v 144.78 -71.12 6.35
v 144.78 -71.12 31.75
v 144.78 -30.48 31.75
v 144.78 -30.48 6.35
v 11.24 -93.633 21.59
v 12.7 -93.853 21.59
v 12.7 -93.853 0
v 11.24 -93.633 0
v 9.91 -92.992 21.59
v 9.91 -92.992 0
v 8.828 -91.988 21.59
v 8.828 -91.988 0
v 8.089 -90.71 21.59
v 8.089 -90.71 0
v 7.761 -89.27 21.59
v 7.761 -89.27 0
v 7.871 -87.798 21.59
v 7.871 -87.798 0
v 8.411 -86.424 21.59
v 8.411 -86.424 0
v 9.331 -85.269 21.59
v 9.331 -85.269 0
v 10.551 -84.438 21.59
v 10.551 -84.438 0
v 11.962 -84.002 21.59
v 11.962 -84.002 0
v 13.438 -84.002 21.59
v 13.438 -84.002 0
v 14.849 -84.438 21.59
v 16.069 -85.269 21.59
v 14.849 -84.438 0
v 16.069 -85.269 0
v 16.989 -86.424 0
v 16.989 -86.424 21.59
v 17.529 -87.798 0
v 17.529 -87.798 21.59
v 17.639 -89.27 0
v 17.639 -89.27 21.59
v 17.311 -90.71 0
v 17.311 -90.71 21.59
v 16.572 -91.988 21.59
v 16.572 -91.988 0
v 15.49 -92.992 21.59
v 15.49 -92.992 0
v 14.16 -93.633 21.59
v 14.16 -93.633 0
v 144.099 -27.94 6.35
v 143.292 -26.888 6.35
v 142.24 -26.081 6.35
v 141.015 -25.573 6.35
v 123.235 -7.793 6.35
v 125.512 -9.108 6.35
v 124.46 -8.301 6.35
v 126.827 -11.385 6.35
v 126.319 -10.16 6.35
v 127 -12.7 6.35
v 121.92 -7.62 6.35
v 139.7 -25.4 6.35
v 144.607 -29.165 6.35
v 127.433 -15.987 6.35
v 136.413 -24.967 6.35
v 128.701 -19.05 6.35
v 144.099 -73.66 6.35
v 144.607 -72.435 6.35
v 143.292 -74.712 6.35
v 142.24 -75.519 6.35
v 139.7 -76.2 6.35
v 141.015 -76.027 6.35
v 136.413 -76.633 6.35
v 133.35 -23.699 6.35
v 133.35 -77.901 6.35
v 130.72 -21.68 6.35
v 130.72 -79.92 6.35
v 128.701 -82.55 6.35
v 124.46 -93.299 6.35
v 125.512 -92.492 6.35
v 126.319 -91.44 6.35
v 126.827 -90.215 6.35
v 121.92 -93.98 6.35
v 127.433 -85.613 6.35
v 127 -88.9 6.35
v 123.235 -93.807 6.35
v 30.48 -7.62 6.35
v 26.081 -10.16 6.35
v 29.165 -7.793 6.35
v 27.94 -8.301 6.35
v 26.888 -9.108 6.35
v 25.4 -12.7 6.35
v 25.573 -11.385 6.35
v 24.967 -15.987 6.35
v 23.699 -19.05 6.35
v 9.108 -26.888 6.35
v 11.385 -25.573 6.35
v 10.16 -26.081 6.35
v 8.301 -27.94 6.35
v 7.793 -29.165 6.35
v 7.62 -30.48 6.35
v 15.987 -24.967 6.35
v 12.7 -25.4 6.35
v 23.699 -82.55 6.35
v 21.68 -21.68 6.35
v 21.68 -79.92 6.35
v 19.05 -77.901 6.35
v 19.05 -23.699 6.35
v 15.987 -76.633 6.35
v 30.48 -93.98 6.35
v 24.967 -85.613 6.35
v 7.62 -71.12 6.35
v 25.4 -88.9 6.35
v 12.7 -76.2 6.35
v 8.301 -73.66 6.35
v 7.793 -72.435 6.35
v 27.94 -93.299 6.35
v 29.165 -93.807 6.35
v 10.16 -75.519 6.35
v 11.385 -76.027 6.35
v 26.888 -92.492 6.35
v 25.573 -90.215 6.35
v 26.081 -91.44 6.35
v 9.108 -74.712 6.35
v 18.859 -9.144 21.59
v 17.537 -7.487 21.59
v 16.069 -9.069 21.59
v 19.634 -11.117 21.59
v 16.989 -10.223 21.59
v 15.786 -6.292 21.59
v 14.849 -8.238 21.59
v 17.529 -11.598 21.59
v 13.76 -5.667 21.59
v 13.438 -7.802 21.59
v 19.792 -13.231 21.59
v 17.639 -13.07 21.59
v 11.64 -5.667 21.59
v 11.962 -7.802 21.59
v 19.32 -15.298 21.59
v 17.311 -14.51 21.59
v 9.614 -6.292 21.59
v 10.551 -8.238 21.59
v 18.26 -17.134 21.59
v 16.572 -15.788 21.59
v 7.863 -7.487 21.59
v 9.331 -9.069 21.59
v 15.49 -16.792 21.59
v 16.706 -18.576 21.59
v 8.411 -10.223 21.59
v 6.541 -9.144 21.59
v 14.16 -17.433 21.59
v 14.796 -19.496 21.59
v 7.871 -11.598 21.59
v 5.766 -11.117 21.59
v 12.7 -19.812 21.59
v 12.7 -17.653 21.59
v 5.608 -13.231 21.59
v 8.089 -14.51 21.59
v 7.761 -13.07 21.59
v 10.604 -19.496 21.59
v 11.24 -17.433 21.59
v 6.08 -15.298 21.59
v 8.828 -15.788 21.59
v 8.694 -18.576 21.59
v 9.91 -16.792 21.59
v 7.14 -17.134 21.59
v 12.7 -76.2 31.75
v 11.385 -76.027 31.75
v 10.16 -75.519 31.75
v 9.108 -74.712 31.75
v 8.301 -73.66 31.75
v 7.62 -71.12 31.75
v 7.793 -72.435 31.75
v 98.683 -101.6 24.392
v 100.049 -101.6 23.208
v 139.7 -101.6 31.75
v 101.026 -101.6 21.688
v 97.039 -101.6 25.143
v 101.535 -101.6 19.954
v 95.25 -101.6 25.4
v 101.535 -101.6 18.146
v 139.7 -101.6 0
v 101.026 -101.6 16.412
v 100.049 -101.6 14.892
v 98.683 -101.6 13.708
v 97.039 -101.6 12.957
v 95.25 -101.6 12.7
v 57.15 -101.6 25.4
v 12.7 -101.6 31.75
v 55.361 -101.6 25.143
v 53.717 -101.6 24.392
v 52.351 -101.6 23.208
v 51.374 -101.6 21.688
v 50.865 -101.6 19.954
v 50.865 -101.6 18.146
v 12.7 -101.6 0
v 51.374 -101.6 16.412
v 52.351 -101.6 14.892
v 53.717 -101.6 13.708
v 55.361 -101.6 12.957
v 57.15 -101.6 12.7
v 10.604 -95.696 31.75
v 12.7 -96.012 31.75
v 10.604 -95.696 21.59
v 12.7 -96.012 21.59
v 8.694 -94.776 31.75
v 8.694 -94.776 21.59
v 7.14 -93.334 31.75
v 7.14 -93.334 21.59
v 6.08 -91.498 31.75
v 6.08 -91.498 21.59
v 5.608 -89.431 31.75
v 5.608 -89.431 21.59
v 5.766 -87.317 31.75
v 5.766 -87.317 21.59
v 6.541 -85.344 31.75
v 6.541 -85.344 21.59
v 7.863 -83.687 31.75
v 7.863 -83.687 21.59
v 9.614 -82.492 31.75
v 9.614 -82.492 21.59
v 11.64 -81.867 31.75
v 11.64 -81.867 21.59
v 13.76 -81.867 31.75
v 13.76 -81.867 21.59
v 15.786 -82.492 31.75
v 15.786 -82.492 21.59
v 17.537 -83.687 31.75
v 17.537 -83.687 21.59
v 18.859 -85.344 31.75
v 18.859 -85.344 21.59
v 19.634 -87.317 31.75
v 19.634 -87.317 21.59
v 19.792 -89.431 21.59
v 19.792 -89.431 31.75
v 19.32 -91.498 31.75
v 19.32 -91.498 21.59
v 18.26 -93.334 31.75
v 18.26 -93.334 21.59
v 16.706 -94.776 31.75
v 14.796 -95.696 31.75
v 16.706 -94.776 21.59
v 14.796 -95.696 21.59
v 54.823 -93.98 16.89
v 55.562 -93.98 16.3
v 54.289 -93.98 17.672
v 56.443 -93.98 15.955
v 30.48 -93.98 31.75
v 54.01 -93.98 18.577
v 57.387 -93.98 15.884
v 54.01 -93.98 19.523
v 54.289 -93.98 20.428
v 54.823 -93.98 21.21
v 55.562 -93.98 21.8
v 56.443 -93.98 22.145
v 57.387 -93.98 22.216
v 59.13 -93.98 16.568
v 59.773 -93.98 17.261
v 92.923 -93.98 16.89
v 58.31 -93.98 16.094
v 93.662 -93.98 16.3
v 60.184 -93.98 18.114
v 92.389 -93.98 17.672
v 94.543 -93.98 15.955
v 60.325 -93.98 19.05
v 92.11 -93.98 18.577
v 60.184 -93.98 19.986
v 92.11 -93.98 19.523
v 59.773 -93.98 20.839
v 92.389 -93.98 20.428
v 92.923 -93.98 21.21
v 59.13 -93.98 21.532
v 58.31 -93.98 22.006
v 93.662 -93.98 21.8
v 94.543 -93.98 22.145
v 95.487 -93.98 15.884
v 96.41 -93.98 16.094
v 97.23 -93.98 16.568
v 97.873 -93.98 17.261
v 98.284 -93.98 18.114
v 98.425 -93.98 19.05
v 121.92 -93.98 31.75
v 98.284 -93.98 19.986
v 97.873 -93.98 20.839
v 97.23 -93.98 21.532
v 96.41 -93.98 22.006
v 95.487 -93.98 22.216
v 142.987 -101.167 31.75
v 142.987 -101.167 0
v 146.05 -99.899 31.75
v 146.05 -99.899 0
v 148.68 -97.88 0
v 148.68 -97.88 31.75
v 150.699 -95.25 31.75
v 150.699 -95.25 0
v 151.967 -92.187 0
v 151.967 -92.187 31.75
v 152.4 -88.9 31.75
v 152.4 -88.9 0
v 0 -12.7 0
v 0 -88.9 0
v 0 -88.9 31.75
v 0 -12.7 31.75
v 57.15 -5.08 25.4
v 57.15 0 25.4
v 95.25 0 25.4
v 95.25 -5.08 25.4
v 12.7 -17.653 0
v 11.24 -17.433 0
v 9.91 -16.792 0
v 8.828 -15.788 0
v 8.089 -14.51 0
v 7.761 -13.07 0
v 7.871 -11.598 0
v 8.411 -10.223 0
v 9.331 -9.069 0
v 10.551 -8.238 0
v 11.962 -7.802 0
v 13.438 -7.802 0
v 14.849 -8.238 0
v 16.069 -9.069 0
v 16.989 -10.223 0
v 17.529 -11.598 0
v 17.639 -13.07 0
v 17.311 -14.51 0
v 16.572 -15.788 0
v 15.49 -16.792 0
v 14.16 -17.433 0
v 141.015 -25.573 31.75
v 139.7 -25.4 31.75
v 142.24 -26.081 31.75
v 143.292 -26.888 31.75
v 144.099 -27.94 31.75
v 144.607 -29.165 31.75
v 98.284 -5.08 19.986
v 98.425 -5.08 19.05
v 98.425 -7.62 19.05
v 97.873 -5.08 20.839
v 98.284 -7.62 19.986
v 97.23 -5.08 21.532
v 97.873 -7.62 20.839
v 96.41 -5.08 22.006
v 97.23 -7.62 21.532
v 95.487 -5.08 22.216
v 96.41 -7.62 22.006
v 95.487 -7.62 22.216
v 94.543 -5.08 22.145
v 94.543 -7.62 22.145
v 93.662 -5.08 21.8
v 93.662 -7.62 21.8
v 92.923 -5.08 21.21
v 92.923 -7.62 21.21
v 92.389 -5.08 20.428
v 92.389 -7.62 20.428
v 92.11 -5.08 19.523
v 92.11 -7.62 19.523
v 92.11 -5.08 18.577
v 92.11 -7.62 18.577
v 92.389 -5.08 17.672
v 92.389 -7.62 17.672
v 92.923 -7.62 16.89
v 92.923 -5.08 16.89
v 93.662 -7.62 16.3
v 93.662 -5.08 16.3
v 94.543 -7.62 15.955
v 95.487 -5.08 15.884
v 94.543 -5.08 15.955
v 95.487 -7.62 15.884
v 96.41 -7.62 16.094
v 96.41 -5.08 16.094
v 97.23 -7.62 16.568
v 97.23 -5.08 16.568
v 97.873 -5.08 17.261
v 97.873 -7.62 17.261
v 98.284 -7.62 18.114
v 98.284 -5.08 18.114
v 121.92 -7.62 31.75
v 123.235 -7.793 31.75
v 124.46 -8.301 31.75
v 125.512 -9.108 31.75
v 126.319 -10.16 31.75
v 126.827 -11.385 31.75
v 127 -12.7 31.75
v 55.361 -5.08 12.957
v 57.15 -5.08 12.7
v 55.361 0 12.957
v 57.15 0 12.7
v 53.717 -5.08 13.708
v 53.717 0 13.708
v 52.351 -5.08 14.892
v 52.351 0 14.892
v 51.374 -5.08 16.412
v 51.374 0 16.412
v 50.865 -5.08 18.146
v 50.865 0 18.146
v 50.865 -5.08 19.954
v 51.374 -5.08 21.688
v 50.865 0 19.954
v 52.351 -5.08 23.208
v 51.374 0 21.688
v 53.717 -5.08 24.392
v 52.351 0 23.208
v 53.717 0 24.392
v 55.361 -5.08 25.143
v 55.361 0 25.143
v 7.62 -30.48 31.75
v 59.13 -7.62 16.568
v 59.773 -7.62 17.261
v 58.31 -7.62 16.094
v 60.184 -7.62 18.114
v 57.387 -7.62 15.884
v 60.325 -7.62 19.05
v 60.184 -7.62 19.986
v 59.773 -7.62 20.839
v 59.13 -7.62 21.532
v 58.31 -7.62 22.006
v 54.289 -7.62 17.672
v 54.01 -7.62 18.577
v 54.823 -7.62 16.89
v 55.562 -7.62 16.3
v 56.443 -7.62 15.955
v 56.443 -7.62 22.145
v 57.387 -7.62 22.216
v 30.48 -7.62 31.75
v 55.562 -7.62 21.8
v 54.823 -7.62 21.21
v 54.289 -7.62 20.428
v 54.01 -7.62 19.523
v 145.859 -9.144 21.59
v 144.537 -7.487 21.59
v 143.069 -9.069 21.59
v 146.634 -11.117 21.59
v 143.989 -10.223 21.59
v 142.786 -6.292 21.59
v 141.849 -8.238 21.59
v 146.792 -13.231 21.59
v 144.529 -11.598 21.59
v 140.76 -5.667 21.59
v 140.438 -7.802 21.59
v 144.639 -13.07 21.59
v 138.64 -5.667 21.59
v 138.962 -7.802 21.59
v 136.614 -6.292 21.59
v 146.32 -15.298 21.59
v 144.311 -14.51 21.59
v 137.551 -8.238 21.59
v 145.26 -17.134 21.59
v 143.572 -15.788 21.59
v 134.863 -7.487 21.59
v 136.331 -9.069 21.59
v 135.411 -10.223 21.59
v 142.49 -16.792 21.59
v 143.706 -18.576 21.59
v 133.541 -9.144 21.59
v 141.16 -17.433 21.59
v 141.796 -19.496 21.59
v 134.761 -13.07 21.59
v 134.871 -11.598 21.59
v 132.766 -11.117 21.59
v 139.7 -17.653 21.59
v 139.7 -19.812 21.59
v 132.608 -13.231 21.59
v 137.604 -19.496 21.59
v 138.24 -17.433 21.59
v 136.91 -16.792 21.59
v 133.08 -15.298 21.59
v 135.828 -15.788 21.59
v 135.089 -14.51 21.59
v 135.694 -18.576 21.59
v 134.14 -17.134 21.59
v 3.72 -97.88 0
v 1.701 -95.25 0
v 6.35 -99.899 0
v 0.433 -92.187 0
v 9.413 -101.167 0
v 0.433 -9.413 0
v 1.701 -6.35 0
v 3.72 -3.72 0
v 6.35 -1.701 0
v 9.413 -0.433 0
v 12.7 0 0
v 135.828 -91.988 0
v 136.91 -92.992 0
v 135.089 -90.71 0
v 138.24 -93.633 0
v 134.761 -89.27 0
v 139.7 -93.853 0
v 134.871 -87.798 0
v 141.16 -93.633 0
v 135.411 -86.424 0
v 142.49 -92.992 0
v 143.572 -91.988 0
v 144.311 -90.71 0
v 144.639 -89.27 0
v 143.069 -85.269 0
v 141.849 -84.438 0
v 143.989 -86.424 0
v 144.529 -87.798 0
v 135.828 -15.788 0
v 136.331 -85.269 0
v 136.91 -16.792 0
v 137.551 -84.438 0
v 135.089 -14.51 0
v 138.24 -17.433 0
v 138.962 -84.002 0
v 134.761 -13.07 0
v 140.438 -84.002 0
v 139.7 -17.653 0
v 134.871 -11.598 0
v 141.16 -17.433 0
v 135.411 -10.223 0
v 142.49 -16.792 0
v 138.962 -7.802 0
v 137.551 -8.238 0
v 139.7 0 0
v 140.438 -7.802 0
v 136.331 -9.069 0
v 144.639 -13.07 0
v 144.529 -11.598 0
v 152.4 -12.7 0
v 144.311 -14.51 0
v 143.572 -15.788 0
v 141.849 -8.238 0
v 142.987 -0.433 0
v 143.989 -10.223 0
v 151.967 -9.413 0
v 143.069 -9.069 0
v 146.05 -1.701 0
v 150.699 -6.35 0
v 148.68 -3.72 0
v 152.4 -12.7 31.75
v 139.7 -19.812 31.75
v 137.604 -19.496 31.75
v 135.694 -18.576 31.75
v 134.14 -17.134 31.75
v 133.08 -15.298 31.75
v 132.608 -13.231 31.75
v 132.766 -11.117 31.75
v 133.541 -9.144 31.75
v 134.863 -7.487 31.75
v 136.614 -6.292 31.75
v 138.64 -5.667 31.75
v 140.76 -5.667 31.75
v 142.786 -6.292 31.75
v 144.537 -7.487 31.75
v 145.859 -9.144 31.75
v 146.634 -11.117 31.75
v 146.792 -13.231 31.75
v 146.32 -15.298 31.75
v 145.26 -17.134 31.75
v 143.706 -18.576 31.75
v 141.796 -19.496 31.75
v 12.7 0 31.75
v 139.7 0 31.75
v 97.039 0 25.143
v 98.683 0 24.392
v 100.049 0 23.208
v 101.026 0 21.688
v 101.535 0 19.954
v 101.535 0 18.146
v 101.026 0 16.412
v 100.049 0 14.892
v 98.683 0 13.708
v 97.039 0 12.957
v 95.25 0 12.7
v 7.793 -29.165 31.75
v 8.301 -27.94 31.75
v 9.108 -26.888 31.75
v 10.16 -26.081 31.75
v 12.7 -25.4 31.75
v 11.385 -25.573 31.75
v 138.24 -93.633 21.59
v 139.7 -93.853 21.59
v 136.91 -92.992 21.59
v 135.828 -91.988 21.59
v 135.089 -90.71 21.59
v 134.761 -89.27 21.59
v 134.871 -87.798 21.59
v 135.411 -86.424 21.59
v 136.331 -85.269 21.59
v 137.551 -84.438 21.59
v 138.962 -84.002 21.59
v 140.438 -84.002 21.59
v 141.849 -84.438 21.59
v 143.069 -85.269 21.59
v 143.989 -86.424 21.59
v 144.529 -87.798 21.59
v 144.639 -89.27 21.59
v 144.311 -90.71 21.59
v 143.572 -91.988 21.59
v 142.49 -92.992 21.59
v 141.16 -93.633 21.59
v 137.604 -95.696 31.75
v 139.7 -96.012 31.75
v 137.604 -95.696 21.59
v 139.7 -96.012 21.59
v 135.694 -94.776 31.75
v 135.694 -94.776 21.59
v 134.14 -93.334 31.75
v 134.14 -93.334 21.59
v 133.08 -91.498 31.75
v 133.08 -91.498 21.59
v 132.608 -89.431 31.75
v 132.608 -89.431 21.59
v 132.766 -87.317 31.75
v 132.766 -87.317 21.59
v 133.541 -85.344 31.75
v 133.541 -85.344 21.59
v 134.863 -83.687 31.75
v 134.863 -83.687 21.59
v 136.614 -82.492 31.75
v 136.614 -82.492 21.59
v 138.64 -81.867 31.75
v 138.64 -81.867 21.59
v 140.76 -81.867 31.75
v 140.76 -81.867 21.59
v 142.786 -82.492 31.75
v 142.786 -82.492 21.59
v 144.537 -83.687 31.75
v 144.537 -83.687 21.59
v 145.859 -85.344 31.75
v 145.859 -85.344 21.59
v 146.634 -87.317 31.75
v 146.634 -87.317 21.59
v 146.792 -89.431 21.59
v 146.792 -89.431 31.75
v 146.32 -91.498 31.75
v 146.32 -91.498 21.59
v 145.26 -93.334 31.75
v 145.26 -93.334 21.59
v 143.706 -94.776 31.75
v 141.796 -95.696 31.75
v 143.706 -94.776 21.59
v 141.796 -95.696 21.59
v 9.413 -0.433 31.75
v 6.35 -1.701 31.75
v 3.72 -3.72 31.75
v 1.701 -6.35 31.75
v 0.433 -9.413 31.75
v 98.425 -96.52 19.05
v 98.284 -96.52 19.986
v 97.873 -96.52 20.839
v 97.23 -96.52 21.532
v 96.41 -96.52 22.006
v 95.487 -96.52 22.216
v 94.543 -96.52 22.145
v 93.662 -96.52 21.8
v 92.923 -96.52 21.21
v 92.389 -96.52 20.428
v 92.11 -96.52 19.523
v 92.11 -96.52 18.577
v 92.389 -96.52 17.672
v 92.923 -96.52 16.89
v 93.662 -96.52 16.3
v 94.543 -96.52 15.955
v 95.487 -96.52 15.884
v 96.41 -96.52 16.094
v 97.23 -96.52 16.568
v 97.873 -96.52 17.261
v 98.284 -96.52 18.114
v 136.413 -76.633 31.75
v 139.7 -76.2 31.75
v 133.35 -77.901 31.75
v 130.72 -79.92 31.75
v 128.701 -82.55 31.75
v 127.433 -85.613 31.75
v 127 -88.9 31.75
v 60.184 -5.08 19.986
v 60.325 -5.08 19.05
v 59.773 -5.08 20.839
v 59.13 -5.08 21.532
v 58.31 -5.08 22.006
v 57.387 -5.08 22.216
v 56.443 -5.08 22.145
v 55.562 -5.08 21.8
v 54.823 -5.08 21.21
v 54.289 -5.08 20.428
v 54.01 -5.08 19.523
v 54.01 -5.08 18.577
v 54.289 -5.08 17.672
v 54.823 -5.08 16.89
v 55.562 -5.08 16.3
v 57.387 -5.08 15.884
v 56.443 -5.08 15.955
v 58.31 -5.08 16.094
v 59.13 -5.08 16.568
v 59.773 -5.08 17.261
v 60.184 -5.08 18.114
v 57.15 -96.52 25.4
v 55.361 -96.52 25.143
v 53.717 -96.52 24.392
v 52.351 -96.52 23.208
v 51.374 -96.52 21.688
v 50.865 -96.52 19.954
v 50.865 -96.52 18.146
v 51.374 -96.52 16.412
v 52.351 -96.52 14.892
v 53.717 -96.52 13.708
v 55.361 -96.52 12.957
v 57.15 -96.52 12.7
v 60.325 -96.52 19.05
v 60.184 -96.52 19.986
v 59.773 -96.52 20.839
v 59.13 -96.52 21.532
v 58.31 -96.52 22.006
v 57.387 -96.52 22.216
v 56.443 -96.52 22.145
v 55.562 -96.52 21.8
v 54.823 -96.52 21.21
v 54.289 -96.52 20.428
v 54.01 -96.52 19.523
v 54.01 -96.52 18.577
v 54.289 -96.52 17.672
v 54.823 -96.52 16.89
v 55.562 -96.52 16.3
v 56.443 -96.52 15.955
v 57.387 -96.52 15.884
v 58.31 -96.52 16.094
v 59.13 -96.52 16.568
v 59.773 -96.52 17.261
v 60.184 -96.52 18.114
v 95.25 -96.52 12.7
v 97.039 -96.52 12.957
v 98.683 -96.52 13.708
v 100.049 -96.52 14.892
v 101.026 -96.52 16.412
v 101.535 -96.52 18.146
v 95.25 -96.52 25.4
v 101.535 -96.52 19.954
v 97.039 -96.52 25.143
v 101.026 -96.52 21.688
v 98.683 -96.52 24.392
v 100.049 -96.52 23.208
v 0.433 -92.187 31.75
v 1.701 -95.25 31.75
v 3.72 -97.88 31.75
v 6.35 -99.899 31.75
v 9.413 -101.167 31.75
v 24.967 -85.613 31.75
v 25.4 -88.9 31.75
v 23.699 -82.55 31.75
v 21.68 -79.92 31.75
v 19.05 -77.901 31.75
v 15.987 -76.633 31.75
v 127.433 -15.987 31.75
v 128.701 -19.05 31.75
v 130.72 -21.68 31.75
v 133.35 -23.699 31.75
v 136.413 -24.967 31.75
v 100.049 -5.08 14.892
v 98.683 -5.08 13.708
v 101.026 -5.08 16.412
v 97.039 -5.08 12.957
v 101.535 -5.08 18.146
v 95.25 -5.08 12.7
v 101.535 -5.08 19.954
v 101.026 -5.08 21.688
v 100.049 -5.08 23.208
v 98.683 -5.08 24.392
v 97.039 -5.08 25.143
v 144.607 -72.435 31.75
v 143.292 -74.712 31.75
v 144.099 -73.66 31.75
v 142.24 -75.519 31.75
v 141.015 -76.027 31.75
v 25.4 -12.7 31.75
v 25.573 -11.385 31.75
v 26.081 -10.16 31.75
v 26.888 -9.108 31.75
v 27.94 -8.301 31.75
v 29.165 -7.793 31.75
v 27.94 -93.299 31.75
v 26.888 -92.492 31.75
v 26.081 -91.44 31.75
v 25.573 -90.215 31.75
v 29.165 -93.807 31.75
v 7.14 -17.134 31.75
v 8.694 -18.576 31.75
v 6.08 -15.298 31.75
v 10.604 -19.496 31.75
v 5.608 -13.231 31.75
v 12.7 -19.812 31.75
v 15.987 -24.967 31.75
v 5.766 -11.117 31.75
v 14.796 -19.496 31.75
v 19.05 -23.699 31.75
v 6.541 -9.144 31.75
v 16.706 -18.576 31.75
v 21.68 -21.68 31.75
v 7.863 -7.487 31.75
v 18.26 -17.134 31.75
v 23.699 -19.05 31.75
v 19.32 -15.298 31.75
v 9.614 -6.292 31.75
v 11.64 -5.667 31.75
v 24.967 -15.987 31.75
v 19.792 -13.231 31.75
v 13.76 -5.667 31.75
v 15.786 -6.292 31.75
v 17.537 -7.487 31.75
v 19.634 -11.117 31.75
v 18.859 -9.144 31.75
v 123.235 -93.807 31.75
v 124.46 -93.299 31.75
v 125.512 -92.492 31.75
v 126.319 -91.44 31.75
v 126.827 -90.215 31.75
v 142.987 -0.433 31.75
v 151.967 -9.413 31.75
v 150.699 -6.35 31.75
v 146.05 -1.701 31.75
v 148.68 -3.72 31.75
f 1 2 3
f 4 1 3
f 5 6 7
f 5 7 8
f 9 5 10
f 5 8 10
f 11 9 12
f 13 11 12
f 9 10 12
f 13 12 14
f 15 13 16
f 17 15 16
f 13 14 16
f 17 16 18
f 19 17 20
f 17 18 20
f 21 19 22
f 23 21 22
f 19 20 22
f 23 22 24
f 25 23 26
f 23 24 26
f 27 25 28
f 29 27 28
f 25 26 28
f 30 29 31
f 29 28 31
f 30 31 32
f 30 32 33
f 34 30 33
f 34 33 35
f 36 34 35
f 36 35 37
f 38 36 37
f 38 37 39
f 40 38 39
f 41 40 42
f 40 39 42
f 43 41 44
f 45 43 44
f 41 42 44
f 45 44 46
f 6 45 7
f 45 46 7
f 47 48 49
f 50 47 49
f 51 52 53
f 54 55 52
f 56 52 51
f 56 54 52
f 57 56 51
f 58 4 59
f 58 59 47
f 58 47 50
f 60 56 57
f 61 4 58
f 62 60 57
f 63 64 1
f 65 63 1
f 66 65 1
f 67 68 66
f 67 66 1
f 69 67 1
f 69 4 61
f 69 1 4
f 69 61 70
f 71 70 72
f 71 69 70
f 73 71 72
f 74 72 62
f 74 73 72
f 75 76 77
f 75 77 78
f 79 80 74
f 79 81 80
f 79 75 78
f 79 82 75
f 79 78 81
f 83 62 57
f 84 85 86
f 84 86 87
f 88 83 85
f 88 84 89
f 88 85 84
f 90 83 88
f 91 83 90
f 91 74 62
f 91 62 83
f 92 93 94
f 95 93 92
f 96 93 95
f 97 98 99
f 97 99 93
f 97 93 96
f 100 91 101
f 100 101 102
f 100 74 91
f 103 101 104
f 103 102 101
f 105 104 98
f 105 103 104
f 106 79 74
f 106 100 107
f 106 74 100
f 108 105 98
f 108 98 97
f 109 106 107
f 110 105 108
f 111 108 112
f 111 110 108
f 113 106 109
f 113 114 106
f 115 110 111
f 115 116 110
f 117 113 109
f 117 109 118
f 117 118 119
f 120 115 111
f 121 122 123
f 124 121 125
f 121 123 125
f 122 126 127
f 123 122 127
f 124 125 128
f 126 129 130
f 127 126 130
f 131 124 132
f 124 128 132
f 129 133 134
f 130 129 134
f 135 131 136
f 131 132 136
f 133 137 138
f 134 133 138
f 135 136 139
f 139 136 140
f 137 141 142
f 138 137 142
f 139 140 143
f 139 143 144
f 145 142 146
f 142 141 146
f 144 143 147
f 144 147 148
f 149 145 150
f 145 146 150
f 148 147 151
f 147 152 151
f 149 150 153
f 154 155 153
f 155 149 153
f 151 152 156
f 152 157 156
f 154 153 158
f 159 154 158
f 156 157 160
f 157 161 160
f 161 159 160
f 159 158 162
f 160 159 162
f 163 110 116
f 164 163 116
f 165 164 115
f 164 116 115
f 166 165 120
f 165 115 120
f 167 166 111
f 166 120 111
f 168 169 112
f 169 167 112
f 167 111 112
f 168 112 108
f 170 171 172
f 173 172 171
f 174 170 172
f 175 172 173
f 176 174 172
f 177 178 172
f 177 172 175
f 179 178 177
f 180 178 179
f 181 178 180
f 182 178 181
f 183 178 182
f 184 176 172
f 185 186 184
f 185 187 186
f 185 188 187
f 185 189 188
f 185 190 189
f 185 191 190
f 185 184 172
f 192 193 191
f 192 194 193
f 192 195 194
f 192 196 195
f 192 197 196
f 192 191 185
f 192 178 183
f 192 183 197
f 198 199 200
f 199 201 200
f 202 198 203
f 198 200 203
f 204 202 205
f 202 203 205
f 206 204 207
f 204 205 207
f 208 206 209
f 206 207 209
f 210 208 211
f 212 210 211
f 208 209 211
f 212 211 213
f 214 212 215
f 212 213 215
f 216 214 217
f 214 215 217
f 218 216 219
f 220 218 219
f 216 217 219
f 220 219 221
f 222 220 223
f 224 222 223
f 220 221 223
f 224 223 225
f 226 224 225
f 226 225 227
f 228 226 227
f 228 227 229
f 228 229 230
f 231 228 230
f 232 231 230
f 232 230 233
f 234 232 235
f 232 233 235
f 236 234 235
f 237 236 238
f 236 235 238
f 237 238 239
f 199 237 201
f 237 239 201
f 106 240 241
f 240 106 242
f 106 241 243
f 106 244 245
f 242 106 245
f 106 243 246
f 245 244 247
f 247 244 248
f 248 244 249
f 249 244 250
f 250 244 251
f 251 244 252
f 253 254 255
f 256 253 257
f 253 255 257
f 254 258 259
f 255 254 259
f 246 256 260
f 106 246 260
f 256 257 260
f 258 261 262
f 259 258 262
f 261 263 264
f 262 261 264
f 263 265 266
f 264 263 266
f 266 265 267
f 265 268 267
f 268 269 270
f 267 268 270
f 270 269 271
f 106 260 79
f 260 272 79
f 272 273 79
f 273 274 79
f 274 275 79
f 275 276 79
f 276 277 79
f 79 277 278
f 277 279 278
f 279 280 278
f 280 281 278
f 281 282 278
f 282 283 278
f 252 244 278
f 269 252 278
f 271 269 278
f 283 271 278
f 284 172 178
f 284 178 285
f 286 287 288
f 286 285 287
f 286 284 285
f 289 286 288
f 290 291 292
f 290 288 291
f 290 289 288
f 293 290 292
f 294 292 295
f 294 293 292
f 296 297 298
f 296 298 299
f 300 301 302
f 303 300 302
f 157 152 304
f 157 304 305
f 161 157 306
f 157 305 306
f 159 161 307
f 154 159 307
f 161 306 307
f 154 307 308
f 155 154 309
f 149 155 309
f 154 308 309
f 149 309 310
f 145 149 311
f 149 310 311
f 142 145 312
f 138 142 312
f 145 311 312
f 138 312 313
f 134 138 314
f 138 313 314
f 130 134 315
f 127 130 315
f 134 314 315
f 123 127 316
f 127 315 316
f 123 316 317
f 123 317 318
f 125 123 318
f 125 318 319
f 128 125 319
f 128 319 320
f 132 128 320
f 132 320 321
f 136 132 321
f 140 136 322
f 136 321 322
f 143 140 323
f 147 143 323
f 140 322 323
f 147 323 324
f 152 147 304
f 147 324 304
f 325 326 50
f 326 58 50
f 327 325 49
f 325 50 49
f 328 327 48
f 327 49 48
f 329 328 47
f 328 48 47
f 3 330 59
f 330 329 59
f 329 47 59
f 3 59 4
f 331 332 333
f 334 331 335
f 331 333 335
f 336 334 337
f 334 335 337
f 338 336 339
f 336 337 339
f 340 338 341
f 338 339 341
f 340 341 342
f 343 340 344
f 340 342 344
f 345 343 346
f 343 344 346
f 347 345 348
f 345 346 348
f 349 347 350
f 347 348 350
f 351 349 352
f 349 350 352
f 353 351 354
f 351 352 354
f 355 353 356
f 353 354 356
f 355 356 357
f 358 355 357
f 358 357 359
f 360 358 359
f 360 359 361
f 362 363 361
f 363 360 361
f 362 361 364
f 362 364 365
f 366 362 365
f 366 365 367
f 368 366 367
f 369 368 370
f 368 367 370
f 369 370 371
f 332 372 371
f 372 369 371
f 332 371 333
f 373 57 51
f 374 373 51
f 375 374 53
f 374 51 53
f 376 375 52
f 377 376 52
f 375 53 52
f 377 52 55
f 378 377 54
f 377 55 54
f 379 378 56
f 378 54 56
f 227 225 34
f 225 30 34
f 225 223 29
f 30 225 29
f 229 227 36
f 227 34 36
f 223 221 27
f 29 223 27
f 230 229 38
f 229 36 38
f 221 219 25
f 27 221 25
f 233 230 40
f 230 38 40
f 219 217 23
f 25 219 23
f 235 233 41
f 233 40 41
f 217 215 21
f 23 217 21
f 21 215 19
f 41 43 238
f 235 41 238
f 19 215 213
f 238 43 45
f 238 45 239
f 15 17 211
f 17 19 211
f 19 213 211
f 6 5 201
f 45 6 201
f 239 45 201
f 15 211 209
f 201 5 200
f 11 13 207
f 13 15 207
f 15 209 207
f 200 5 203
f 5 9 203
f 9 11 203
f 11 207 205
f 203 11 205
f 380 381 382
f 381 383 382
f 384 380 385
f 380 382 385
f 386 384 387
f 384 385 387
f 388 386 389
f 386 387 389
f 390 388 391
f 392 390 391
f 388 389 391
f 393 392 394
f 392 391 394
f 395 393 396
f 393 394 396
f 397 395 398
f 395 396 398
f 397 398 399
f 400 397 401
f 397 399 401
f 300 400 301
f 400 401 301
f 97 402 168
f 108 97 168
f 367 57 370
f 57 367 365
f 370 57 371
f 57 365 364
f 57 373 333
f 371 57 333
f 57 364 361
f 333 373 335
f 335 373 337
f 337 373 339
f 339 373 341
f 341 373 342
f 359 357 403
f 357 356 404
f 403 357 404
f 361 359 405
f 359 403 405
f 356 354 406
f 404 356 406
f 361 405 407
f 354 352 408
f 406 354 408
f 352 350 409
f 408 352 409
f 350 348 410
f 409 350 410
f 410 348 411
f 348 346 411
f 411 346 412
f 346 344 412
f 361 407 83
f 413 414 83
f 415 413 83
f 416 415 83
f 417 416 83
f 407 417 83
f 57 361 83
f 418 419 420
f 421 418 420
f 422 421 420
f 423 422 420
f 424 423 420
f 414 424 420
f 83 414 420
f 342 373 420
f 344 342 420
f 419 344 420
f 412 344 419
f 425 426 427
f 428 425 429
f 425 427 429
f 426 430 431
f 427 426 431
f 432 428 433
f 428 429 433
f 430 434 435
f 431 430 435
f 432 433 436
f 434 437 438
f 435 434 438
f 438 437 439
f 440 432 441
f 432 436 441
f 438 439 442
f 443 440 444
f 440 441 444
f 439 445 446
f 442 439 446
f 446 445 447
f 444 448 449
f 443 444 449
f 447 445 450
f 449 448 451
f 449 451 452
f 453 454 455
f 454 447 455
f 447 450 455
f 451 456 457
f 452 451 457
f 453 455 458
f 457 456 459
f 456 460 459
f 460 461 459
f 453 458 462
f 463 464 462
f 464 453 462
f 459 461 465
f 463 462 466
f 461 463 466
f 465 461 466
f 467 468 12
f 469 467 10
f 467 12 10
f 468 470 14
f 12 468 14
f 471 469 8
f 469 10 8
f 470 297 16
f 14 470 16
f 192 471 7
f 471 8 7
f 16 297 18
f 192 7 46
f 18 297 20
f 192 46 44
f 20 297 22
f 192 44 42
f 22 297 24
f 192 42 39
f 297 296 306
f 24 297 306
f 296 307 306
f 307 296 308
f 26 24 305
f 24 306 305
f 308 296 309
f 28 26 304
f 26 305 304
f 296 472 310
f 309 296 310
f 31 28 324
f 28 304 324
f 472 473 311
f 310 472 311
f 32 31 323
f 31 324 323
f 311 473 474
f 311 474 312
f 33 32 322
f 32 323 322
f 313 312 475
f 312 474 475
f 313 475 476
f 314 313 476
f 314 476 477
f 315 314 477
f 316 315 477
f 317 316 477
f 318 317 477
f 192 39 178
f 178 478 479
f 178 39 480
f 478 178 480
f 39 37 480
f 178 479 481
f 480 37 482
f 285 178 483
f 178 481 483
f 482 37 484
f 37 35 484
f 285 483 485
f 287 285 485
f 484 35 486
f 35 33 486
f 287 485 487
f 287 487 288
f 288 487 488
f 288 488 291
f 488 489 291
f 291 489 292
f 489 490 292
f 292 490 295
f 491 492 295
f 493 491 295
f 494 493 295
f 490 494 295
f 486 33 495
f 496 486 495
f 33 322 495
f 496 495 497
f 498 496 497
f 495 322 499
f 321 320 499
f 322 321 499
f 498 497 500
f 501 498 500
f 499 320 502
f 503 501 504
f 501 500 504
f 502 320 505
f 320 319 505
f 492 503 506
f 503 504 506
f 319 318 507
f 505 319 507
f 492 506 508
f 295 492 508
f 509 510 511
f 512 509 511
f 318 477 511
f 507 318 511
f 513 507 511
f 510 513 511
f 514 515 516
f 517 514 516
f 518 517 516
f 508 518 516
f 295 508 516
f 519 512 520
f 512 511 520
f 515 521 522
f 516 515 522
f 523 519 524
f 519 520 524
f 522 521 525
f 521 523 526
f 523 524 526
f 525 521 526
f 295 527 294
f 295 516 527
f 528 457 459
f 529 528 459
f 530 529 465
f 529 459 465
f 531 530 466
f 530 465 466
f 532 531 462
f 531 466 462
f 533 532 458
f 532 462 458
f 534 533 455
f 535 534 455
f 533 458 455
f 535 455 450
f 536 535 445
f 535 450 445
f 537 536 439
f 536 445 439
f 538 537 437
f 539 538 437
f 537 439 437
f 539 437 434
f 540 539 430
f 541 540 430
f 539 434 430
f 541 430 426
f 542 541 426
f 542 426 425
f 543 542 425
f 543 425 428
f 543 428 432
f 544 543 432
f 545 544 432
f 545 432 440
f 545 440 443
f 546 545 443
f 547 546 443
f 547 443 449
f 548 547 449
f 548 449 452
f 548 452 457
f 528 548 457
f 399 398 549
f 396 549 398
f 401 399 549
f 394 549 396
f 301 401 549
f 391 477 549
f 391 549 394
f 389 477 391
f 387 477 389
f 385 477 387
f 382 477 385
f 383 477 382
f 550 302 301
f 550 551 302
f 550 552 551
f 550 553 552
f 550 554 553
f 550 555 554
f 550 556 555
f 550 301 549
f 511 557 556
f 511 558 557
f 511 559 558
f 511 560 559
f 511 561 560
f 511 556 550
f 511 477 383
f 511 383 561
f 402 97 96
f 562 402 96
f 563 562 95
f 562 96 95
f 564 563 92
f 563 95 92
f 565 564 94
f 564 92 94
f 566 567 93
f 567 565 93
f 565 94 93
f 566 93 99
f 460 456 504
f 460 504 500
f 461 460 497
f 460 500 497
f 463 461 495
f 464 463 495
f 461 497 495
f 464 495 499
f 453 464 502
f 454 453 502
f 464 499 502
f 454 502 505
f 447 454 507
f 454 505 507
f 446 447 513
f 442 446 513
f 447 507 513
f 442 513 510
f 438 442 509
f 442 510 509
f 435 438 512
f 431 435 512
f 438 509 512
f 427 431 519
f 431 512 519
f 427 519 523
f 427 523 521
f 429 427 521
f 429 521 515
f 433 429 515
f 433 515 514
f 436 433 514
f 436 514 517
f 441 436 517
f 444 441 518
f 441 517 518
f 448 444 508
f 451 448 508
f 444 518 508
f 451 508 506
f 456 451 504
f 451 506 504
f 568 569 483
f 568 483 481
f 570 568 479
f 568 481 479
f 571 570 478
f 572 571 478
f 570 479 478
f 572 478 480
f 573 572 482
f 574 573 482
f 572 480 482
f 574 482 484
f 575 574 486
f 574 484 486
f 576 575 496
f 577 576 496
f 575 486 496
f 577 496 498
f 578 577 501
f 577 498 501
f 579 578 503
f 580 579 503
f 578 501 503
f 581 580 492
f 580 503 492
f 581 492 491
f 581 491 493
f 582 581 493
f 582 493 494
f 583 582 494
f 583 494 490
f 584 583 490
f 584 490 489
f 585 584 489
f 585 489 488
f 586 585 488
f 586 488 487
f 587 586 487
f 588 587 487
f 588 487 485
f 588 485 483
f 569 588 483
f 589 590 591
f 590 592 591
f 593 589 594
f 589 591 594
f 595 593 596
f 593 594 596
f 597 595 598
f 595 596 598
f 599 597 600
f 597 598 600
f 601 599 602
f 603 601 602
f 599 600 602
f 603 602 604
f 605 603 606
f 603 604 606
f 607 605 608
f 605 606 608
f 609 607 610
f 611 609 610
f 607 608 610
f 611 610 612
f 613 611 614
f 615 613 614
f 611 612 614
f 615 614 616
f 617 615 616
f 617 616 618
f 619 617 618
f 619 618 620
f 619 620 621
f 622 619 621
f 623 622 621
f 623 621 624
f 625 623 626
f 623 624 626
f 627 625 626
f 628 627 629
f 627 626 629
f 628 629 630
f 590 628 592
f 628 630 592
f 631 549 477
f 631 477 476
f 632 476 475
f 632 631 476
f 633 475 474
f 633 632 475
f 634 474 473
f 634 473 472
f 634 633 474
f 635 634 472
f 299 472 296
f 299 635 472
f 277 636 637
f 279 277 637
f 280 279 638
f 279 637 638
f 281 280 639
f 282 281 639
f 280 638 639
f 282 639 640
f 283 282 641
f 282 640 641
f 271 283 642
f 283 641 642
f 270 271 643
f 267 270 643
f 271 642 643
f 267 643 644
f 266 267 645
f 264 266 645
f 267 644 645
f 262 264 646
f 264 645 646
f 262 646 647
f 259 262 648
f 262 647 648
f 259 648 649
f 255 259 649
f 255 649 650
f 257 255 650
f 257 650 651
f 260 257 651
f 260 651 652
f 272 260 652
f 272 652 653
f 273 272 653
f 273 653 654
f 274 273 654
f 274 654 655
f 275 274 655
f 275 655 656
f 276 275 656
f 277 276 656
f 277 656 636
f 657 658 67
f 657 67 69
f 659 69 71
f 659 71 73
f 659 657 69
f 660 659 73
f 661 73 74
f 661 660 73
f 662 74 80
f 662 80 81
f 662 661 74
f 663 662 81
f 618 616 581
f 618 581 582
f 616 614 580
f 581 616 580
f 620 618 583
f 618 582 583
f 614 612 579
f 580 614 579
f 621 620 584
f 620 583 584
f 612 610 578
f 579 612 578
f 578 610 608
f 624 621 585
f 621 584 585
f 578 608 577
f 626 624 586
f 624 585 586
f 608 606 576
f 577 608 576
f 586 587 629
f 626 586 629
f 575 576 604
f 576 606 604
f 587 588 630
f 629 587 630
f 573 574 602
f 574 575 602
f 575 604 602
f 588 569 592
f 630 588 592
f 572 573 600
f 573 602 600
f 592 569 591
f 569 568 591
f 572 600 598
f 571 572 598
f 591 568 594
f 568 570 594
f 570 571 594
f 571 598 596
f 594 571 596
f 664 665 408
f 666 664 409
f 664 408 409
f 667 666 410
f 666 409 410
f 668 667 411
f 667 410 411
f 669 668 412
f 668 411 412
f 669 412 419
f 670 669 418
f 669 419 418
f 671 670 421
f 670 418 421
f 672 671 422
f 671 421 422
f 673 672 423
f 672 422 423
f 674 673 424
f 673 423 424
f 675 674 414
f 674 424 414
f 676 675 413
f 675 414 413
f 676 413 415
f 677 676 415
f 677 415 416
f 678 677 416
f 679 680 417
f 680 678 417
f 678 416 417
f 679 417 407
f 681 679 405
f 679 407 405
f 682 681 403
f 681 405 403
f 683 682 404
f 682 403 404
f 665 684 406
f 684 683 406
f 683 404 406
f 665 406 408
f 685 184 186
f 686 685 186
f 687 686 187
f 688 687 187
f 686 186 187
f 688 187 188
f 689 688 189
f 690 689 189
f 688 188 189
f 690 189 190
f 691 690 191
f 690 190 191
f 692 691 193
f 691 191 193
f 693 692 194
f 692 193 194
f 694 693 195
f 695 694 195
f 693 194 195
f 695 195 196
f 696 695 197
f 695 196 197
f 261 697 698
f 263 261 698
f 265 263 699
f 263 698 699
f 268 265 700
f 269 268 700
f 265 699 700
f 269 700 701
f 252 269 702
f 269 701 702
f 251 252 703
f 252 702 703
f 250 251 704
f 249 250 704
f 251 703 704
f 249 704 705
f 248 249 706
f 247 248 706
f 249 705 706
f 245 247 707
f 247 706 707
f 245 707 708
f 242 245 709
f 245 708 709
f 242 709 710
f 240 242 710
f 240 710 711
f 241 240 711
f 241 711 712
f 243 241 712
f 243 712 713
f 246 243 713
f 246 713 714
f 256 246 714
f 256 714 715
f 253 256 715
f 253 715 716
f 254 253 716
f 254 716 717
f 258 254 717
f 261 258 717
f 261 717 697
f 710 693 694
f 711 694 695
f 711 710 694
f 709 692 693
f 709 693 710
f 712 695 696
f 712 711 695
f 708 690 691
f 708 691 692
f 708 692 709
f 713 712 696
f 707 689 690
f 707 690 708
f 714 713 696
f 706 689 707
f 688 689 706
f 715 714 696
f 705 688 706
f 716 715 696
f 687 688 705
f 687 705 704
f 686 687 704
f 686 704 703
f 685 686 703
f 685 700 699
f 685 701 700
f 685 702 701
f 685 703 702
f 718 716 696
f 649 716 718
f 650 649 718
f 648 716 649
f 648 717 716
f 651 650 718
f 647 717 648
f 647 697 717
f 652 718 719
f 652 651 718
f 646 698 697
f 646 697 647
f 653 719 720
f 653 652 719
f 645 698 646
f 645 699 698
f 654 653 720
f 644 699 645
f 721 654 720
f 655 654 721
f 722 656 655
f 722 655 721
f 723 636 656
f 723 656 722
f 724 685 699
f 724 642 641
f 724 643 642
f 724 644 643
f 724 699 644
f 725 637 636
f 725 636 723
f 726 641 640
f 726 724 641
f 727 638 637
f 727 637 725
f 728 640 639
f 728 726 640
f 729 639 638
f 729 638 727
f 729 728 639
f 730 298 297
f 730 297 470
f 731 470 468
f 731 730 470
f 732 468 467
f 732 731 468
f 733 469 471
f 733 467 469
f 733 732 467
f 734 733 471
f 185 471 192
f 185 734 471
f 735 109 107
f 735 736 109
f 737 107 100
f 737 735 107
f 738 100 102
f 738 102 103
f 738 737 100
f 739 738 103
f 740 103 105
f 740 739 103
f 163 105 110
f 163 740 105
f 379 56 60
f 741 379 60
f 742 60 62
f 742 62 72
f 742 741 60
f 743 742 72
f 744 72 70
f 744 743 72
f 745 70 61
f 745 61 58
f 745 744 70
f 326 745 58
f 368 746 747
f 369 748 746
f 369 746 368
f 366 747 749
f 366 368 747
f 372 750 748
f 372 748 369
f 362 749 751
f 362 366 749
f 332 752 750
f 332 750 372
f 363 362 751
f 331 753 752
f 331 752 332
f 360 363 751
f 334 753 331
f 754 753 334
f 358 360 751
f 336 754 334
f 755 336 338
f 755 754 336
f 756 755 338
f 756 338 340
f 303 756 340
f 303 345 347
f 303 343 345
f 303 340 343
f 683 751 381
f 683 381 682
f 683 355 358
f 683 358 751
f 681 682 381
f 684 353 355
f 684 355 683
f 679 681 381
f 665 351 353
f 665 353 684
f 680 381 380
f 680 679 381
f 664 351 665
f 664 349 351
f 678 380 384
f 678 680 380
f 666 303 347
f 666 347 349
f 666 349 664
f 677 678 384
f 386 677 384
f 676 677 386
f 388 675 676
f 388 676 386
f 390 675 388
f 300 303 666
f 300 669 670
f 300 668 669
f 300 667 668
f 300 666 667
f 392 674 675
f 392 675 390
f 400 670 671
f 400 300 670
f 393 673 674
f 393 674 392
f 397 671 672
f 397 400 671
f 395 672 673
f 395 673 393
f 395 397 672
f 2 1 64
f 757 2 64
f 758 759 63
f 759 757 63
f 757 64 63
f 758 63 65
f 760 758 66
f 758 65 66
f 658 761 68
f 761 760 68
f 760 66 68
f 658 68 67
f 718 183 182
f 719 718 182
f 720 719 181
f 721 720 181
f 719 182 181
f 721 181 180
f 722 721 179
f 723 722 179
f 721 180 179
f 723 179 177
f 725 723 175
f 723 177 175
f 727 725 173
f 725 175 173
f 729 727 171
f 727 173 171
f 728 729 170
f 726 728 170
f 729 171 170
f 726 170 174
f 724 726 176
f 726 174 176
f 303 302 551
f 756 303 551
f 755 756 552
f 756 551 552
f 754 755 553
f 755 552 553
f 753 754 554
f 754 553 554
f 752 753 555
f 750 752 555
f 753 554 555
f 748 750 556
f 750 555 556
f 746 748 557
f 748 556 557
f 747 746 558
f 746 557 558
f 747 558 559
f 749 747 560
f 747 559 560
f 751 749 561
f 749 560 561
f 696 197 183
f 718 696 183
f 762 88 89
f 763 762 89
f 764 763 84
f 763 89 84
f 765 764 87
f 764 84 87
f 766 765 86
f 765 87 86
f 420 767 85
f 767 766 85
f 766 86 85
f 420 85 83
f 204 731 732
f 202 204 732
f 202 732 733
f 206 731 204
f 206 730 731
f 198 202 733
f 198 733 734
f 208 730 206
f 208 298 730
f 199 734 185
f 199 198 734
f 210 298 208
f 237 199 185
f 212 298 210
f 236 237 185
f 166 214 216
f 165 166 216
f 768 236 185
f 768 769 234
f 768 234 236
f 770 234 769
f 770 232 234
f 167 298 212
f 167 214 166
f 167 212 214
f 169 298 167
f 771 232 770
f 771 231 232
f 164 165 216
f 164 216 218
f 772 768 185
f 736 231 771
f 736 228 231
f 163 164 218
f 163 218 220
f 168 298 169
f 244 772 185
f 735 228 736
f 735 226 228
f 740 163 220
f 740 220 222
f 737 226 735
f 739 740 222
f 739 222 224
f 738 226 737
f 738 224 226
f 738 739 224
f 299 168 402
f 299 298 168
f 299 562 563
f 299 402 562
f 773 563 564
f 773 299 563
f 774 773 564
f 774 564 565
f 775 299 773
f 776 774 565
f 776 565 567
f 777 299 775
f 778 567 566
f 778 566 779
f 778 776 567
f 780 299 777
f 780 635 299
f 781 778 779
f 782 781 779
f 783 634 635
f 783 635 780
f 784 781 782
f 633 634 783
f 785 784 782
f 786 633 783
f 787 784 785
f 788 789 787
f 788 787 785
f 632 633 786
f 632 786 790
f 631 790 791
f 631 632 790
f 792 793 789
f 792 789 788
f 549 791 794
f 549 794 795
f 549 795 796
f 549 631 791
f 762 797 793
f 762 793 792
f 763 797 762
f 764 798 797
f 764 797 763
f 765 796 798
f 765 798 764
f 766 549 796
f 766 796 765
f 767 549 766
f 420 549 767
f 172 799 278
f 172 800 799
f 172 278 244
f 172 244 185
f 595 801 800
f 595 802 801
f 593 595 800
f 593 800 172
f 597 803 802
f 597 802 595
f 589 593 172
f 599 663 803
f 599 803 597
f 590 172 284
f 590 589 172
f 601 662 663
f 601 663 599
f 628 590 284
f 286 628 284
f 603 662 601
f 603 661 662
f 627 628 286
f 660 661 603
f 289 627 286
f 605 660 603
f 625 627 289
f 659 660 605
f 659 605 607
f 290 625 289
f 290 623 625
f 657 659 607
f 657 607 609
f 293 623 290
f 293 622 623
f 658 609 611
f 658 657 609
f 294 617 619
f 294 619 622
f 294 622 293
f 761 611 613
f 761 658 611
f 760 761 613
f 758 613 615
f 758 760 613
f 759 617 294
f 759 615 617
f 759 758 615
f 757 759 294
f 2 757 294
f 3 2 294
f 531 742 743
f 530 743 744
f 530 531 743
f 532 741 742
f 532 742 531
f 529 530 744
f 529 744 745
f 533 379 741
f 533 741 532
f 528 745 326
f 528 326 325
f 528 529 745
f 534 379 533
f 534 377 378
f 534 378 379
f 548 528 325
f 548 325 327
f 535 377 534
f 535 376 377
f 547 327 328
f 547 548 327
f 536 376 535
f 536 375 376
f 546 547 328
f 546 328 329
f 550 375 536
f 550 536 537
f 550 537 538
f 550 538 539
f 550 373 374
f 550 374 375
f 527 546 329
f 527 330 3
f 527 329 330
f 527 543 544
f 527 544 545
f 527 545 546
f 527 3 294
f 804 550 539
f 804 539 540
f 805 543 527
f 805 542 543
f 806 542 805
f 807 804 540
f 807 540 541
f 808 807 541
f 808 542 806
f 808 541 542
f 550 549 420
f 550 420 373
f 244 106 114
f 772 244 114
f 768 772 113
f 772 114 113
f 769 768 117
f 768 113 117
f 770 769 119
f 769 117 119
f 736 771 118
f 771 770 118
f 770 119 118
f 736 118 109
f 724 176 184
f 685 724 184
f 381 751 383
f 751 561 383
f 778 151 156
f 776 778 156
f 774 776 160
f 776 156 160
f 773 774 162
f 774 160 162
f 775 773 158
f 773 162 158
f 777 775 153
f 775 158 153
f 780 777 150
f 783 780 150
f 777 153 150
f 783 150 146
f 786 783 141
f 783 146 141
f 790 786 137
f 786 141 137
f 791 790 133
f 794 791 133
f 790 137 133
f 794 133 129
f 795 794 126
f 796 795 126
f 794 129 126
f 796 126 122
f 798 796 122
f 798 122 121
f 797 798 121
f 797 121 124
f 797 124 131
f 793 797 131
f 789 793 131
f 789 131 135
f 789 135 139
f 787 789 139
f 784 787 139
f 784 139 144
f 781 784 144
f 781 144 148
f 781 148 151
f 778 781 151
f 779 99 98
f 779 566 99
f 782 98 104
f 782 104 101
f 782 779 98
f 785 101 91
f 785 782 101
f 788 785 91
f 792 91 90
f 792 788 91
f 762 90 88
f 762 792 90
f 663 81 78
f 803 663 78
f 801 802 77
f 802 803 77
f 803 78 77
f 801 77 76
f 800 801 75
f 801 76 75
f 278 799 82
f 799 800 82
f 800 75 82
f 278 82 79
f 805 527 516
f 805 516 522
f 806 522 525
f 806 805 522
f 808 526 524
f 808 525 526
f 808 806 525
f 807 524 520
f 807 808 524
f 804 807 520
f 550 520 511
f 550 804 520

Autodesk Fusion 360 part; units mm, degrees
sketch "Sketch1" plane through (0, 0, 0) normal (0, 0, 1) x (1, 0, 0)
  line L0 (0, 0) -> (152.4, 0)
  line L1 (152.4, 0) -> (152.4, -101.6)
  line L2 (152.4, -101.6) -> (0, -101.6)
  line L3 (0, -101.6) -> (0, 0)
  dimension "d1" = 152.4
  dimension "d2" = 101.6
extrude "Extrude1" add sketch "Sketch1" along normal blind 31.75
fillet "Fillet1" radius 12.7 4 edges at (0, -101.6, 15.875) (152.4, -101.6, 15.875) (152.4, 0, 15.875) (0, 0, 15.875)
sketch "Sketch2" plane through (0, 0, 31.75) normal (0, 0, 1) x (-1, 0, 0)
  arc A0 (-12.7, 0) -> (0, 12.7) centre (-12.7, 12.7) ccw
  line L0 (0, 12.7) -> (0, 88.9)
  arc A1 (0, 88.9) -> (-12.7, 101.6) centre (-12.7, 88.9) ccw
  line L1 (-12.7, 101.6) -> (-139.7, 101.6)
  arc A2 (-139.7, 101.6) -> (-152.4, 88.9) centre (-139.7, 88.9) ccw
  line L2 (-152.4, 88.9) -> (-152.4, 12.7)
  arc A3 (-152.4, 12.7) -> (-139.7, 0) centre (-139.7, 12.7) ccw
  line L3 (-139.7, 0) -> (-12.7, 0)
  line L4 (-7.62, 12.7) -> (-7.62, 88.9)
  arc A4 (-7.62, 88.9) -> (-12.7, 93.98) centre (-12.7, 88.9) ccw
  line L5 (-12.7, 93.98) -> (-139.7, 93.98)
  arc A5 (-139.7, 93.98) -> (-144.78, 88.9) centre (-139.7, 88.9) ccw
  line L6 (-144.78, 88.9) -> (-144.78, 12.7)
  arc A6 (-144.78, 12.7) -> (-139.7, 7.62) centre (-139.7, 12.7) ccw
  line L7 (-139.7, 7.62) -> (-12.7, 7.62)
  arc A7 (-12.7, 7.62) -> (-7.62, 12.7) centre (-12.7, 12.7) ccw
  circle A8 centre (-12.7, 12.7) radius 12.7
  circle A9 centre (-139.7, 12.7) radius 12.7
  circle A10 centre (-139.7, 88.9) radius 12.7
  circle A11 centre (-12.7, 88.9) radius 12.7
  dimension "d7" = -7.62
  dimension "d8" = 25.4
  dimension "d9" = 25.4
  dimension "d10" = 25.4
  dimension "d11" = 25.4
extrude "Extrude2" cut sketch "Sketch2" against normal blind 25.4 contours L4 L5 L6 L7 A8 A9 A10 A11
fillet "Fillet2" radius 5.08 8 edges at (144.78, -24.3397, 19.05) (128.0603, -7.62, 19.05) (24.3397, -7.62, 19.05) (7.62, -24.3397, 19.05) (24.3397, -93.98, 19.05) (7.62, -77.2603, 19.05) (144.78, -77.2603, 19.05) (128.0603, -93.98, 19.05)
sketch "Sketch3" plane through (0, 0, 31.75) normal (0, 0, 1) x (-1, 0, 0)
  line L0 (-121.92, 93.98) -> (-30.48, 93.98)
  arc A0 (-25.4, 88.9) -> (-30.48, 93.98) centre (-30.48, 88.9) ccw
  arc A1 (-25.4, 88.9) -> (-12.7, 76.2) centre (-12.7, 88.9) ccw
  arc A2 (-7.62, 71.12) -> (-12.7, 76.2) centre (-12.7, 71.12) ccw
  line L1 (-7.62, 71.12) -> (-7.62, 30.48)
  arc A3 (-12.7, 25.4) -> (-7.62, 30.48) centre (-12.7, 30.48) ccw
  arc A4 (-12.7, 25.4) -> (-25.4, 12.7) centre (-12.7, 12.7) ccw
  arc A5 (-30.48, 7.62) -> (-25.4, 12.7) centre (-30.48, 12.7) ccw
  line L2 (-30.48, 7.62) -> (-121.92, 7.62)
  arc A6 (-127, 12.7) -> (-121.92, 7.62) centre (-121.92, 12.7) ccw
  arc A7 (-127, 12.7) -> (-139.7, 25.4) centre (-139.7, 12.7) ccw
  arc A8 (-144.78, 30.48) -> (-139.7, 25.4) centre (-139.7, 30.48) ccw
  line L3 (-144.78, 30.48) -> (-144.78, 71.12)
  arc A9 (-139.7, 76.2) -> (-144.78, 71.12) centre (-139.7, 71.12) ccw
  arc A10 (-139.7, 76.2) -> (-127, 88.9) centre (-139.7, 88.9) ccw
  arc A11 (-121.92, 93.98) -> (-127, 88.9) centre (-121.92, 88.9) ccw
  arc A12 (-12.7, 0) -> (0, 12.7) centre (-12.7, 12.7) ccw
  line L4 (0, 12.7) -> (0, 88.9)
  arc A13 (0, 88.9) -> (-12.7, 101.6) centre (-12.7, 88.9) ccw
  line L5 (-12.7, 101.6) -> (-139.7, 101.6)
  arc A14 (-139.7, 101.6) -> (-152.4, 88.9) centre (-139.7, 88.9) ccw
  line L6 (-152.4, 88.9) -> (-152.4, 12.7)
  arc A15 (-152.4, 12.7) -> (-139.7, 0) centre (-139.7, 12.7) ccw
  line L7 (-139.7, 0) -> (-12.7, 0)
  point P0 (-12.7, 88.9)
  point P1 (-12.7, 12.7)
  point P2 (-139.7, 12.7)
  point P3 (-139.7, 88.9)
hole "Hole1" at (12.7, -12.7, 31.75) at (139.7, -88.9, 31.75) at (139.7, -12.7, 31.75) at (12.7, -88.9, 31.75) direction (0, 0, -1) diameter 9.906 end through all counterbore diameter 14.224 counterbore depth 10.16
sketch "Sketch4" plane through (0, -101.6, 0) normal (0, -1, 0) x (1, 0, 0)
  line L0 (139.7, 0) -> (139.7, 31.75)
  line L1 (139.7, 31.75) -> (12.7, 31.75)
  line L2 (12.7, 31.75) -> (12.7, 0)
  line L3 (12.7, 0) -> (139.7, 0)
  line L4 (57.15, 12.7) -> (95.25, 12.7)
  arc A0 (95.25, 12.7) -> (95.25, 25.4) centre (95.25, 19.05) ccw
  line L5 (95.25, 25.4) -> (57.15, 25.4)
  arc A1 (57.15, 25.4) -> (57.15, 12.7) centre (57.15, 19.05) ccw
  line L6 (50.8, 19.05) -> (101.6, 19.05) construction
  line L7 (0, 31.75) -> (0, 0)
  circle A2 centre (57.15, 19.05) radius 3.175
  circle A3 centre (95.25, 19.05) radius 3.175
  point P0 (76.2, 19.05)
  dimension "d21" = 12.7
  dimension "d22" = 76.2
  dimension "d23" = 12.7
  dimension "d24" = 6.35
  dimension "d25" = 6.35
extrude "Extrude4" cut sketch "Sketch4" against normal blind 5.08 contours L4 A0 L5 A1
extrude "Extrude3" cut sketch "Sketch4" against normal through all contours A2 | A3
sketch "Sketch6" plane through (0, 0, 0) normal (0, 1, 0) x (-1, 0, 0)
  circle A0 centre (-57.15, 19.05) radius 3.175
  circle A1 centre (-95.25, 19.05) radius 3.175
  line L0 (-12.7, 0) -> (-12.7, 31.75)
  line L1 (-12.7, 31.75) -> (-139.7, 31.75)
  line L2 (-139.7, 31.75) -> (-139.7, 0)
  line L3 (-139.7, 0) -> (-12.7, 0)
  line L4 (-57.15, 25.4) -> (-95.25, 25.4)
  arc A2 (-95.25, 25.4) -> (-95.25, 12.7) centre (-95.25, 19.05) ccw
  line L5 (-95.25, 12.7) -> (-57.15, 12.7)
  arc A3 (-57.15, 12.7) -> (-57.15, 25.4) centre (-57.15, 19.05) ccw
  line L6 (-57.15, 19.05) -> (-95.25, 19.05) construction
  dimension "d29" = 12.7
extrude "Extrude5" cut sketch "Sketch6" against normal blind 5.08 contours L4 A2 L5 A3
equation "d25 = d24"
